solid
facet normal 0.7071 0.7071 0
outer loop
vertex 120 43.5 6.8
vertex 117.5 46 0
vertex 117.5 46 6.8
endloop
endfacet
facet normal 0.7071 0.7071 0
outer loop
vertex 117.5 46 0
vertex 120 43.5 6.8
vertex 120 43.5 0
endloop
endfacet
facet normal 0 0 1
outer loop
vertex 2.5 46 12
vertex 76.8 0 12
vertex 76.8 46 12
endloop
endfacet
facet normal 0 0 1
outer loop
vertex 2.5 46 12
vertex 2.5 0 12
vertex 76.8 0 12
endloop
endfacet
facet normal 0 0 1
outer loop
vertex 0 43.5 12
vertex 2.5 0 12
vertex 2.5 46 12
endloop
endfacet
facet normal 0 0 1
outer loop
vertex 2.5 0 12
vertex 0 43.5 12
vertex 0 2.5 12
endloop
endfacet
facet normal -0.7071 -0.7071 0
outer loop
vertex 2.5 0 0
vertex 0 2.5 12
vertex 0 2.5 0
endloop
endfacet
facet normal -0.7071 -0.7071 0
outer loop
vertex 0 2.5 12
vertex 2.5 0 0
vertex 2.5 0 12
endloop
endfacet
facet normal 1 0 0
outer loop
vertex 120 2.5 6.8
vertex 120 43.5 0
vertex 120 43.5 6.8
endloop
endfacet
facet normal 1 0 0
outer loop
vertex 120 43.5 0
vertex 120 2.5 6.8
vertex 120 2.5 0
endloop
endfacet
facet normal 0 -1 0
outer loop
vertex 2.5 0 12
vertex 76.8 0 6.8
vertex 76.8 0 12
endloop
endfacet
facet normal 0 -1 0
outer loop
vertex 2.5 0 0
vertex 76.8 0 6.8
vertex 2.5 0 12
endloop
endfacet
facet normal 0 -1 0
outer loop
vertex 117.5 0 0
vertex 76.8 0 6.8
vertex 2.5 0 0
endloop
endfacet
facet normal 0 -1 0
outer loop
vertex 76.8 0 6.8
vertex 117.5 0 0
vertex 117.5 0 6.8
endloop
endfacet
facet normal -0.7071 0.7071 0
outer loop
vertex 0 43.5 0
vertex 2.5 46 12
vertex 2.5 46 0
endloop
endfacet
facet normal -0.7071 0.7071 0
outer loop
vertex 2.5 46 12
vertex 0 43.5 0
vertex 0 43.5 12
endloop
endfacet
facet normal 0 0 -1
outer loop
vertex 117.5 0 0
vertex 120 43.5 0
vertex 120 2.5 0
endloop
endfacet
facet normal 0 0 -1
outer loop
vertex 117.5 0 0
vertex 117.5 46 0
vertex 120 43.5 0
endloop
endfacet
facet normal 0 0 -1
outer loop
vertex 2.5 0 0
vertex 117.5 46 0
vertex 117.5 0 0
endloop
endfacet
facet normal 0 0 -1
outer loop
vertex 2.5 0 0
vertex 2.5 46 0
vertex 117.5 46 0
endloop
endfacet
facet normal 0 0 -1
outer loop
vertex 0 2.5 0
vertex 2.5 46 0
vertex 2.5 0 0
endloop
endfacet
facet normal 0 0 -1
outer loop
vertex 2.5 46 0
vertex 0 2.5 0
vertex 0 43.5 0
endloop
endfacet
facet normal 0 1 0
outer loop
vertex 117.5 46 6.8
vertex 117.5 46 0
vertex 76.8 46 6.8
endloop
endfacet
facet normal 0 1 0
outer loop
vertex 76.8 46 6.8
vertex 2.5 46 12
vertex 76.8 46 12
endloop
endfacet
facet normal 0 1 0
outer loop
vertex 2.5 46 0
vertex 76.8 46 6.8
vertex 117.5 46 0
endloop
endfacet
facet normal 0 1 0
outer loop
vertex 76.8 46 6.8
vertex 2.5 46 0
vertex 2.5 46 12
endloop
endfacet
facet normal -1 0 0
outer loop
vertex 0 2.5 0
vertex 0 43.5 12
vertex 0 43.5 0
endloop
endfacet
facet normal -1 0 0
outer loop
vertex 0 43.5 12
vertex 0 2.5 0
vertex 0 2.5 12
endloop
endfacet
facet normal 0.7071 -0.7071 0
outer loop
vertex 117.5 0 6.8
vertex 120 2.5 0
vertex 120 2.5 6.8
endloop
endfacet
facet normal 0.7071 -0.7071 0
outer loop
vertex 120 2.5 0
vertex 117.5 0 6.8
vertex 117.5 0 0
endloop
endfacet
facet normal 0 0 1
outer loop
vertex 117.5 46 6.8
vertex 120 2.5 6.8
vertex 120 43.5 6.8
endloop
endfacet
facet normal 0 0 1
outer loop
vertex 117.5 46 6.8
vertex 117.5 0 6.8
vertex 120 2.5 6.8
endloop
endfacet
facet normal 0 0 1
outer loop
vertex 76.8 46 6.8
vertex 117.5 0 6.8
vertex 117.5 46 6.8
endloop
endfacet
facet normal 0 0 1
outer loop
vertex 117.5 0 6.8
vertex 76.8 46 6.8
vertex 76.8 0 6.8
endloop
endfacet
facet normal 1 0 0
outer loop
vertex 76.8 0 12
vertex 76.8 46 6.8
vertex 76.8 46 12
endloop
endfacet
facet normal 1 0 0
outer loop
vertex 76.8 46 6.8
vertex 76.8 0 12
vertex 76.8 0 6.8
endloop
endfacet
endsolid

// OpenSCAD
$fn = 32;

// ----------------------------------------------------------------------
// Stepped bar: endstep, 120 x 46 x 12/6.8 mm
// ----------------------------------------------------------------------

// --- parameters (mm) ---
bar_l = 120;              // bar length, X
bar_w = 46;               // bar width, Y
plate_t = 12;             // thickness of the thick zone, Z
thin_t = 6.8;             // thickness of the thin zone
corner_c = 2.5;           // corner chamfer of the bar
step_cut = 5.2;           // material removed from the thin zone
step_x = 76.8;            // step position from the left end
depth_1 = 5.2;            // depth of cut 1 from the top face

profile = [[2.5, 0], [117.5, 0], [120, 2.5], [120, 43.5], [117.5, 46], [2.5, 46], [0, 43.5], [0, 2.5]];  // primary outline, 8 points, counter clockwise
void_1 = [[76.8, -1], [121, -1], [121, 47], [76.8, 47]];  // thin zone beyond the step, 4 points

// --- the one profile operation ---
difference() {
  linear_extrude(height = plate_t) polygon(points = profile);
  translate([0, 0, plate_t - depth_1])
    linear_extrude(height = depth_1 + 1) polygon(points = void_1);
}
